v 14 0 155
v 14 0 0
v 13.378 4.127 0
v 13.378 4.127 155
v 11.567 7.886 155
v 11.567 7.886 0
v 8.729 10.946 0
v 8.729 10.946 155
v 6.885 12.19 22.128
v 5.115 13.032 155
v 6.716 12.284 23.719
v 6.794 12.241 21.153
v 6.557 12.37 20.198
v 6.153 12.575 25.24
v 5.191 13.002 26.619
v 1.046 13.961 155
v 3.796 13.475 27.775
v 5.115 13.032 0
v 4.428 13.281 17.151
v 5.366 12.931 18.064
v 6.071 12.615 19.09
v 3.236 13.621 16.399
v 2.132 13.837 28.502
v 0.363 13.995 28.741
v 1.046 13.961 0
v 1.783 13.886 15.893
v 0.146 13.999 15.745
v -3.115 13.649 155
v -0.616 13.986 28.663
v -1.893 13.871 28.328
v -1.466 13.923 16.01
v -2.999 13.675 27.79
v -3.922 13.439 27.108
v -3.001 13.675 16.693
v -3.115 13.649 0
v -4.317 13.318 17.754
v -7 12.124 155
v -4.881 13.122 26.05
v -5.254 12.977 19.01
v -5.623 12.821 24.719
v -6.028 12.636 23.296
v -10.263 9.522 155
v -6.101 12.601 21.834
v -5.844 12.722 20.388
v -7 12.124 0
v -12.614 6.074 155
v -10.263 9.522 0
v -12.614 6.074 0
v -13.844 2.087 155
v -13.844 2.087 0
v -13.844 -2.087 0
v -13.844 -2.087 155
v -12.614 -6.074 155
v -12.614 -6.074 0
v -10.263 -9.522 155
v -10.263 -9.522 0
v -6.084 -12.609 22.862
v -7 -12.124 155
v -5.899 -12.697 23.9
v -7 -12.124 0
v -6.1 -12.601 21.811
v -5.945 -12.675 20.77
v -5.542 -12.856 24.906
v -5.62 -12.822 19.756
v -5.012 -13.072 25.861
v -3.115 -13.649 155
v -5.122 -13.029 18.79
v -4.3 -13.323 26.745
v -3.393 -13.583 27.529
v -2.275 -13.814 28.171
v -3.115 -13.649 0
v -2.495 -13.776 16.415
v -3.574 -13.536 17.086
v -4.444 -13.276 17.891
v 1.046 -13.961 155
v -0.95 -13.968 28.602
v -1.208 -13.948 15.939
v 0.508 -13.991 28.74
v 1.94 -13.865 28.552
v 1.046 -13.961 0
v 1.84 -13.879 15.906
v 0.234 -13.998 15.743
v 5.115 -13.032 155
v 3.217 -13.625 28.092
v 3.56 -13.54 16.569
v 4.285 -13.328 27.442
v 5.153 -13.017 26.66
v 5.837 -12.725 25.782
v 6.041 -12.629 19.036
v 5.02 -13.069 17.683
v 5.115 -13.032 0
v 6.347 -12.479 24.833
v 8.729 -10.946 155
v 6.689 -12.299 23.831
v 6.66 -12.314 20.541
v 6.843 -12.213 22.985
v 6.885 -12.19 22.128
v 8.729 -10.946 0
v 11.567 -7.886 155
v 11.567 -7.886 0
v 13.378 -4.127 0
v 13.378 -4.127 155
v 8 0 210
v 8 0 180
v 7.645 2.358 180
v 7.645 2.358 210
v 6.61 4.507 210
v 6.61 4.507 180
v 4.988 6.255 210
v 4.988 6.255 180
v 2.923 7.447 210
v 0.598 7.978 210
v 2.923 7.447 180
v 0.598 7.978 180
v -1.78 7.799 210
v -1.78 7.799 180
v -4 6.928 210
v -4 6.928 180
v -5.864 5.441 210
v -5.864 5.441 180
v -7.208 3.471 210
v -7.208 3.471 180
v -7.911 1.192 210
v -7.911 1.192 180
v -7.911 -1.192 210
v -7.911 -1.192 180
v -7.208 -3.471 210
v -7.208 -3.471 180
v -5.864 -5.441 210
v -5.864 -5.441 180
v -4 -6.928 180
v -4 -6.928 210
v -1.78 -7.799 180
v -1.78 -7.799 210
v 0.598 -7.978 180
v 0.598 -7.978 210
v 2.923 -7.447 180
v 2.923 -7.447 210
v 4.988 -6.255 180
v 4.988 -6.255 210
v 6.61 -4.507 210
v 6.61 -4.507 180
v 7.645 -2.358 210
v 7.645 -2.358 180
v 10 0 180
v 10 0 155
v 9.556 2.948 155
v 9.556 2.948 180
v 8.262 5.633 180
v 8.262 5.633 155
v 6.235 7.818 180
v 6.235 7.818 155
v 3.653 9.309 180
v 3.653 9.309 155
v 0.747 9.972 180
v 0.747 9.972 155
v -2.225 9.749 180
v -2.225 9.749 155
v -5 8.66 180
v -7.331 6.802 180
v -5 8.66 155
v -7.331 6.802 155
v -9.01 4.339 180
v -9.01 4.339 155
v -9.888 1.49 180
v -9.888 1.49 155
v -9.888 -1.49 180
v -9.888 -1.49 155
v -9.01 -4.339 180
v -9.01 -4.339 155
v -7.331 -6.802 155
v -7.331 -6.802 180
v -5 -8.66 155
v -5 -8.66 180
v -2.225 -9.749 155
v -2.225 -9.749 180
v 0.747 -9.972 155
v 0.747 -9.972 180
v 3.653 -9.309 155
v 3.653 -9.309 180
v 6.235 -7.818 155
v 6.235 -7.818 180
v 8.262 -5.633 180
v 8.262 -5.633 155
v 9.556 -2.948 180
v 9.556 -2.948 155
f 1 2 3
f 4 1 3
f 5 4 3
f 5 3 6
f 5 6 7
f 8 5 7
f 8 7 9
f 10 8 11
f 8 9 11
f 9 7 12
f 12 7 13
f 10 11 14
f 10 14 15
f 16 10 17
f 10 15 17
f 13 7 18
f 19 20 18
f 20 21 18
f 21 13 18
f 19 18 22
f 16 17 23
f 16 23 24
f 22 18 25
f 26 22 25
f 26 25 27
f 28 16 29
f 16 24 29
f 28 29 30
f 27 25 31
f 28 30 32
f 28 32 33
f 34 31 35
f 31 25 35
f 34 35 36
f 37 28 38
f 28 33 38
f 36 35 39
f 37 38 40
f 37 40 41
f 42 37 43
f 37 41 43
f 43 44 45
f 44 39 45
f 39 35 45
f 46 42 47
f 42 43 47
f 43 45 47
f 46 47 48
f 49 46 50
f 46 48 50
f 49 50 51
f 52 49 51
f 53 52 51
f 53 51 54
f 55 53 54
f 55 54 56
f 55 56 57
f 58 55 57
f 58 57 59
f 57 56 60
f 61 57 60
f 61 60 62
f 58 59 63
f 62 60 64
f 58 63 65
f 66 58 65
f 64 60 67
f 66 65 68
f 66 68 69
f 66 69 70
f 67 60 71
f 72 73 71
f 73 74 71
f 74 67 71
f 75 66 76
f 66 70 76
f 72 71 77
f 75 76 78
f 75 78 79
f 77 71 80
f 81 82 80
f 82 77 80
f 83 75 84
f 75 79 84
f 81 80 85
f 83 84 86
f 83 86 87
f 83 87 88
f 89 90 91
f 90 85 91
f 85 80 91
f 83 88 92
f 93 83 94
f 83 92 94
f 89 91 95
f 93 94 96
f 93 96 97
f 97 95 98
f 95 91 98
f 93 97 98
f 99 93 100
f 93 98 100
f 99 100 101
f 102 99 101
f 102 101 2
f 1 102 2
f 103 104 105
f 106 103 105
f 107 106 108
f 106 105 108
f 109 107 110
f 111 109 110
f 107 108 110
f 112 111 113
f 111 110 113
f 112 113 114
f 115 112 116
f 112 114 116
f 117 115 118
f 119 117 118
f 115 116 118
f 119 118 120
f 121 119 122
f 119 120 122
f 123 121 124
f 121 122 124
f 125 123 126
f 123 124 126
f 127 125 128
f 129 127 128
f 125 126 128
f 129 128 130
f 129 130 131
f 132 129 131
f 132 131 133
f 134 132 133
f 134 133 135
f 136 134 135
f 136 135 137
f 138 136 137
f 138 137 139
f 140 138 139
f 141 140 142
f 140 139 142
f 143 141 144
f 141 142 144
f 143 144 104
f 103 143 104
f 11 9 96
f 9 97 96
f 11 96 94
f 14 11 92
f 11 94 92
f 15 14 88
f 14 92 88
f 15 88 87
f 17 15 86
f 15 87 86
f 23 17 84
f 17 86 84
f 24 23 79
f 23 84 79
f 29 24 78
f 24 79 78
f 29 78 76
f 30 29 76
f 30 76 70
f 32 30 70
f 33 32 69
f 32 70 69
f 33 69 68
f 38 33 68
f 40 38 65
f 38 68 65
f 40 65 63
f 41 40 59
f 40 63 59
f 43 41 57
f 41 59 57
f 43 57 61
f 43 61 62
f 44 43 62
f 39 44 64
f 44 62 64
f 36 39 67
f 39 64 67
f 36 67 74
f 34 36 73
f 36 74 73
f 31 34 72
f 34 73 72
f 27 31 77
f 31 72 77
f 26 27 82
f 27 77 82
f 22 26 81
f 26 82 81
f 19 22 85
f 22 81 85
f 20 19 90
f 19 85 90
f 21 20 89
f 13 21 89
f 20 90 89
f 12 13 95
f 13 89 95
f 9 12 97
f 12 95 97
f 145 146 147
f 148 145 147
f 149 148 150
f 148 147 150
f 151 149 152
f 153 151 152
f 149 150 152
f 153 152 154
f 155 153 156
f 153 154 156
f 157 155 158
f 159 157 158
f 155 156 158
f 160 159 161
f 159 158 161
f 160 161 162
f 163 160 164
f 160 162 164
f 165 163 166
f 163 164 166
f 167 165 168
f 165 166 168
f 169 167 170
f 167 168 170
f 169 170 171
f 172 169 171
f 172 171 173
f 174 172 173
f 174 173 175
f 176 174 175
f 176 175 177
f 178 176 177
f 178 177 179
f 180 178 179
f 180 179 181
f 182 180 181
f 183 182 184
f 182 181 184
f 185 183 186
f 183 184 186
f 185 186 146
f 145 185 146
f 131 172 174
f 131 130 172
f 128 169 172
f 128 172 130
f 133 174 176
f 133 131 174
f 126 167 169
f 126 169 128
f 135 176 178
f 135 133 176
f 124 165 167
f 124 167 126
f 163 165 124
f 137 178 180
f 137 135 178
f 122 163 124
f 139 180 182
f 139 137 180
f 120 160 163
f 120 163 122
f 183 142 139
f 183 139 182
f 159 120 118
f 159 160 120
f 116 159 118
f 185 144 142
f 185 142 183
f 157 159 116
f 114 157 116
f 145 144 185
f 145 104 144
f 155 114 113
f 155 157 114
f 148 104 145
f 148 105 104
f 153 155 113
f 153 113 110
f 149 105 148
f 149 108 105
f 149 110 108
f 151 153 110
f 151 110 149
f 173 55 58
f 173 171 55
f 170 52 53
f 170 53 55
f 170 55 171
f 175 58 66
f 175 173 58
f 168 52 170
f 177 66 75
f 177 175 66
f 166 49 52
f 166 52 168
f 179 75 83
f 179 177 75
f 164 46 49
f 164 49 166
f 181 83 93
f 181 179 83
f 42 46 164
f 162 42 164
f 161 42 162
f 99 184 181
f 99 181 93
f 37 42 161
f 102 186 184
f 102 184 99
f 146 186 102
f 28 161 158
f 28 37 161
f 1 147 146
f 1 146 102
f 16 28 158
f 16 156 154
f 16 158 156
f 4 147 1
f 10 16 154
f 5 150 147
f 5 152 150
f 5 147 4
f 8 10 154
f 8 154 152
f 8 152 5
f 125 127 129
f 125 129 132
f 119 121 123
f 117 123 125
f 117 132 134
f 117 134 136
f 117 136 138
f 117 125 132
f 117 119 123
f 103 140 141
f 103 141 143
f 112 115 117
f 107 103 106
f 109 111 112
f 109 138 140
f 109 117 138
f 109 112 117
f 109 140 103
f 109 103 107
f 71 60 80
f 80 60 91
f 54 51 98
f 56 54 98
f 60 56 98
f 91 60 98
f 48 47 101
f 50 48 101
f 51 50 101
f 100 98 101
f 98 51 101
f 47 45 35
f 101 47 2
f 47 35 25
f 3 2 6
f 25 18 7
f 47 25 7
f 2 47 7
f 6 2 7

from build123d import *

# Parameters (mm, degrees)
SKETCH_R     = 14
PAD_DEPTH    = 155
SKETCH001_R  = 10
PAD001_DEPTH = 25
SKETCH002_R  = 8
PAD002_DEPTH = 30
SKETCH003_R  = 6.5
POCKET_DEPTH = 14


with BuildPart() as part:
    # Sketch → Pad (new body)
    with BuildSketch(Plane.XY):
        Circle(SKETCH_R)
    extrude(amount=PAD_DEPTH)

    # Sketch001 (on Face3 of Pad) → Pad001 (join)
    with BuildSketch(Plane.XY.offset(155)):
        Circle(SKETCH001_R)
    extrude(amount=PAD001_DEPTH)

    # Sketch002 (on Face5 of Pad001) → Pad002 (join)
    with BuildSketch(Plane.XY.offset(180)):
        Circle(SKETCH002_R)
    extrude(amount=PAD002_DEPTH)

    # Sketch003 (on DatumPlane) → Pocket (cut, symmetric)
    with BuildSketch(Plane(origin=(0, 0, 210), x_dir=(0.999848, 0, -0.017452), z_dir=(0, -1, 0))):
        with Locations((3.662873, -187.723682)):
            Circle(SKETCH003_R)
    extrude(amount=POCKET_DEPTH, both=True, mode=Mode.SUBTRACT)


solid = part.part
